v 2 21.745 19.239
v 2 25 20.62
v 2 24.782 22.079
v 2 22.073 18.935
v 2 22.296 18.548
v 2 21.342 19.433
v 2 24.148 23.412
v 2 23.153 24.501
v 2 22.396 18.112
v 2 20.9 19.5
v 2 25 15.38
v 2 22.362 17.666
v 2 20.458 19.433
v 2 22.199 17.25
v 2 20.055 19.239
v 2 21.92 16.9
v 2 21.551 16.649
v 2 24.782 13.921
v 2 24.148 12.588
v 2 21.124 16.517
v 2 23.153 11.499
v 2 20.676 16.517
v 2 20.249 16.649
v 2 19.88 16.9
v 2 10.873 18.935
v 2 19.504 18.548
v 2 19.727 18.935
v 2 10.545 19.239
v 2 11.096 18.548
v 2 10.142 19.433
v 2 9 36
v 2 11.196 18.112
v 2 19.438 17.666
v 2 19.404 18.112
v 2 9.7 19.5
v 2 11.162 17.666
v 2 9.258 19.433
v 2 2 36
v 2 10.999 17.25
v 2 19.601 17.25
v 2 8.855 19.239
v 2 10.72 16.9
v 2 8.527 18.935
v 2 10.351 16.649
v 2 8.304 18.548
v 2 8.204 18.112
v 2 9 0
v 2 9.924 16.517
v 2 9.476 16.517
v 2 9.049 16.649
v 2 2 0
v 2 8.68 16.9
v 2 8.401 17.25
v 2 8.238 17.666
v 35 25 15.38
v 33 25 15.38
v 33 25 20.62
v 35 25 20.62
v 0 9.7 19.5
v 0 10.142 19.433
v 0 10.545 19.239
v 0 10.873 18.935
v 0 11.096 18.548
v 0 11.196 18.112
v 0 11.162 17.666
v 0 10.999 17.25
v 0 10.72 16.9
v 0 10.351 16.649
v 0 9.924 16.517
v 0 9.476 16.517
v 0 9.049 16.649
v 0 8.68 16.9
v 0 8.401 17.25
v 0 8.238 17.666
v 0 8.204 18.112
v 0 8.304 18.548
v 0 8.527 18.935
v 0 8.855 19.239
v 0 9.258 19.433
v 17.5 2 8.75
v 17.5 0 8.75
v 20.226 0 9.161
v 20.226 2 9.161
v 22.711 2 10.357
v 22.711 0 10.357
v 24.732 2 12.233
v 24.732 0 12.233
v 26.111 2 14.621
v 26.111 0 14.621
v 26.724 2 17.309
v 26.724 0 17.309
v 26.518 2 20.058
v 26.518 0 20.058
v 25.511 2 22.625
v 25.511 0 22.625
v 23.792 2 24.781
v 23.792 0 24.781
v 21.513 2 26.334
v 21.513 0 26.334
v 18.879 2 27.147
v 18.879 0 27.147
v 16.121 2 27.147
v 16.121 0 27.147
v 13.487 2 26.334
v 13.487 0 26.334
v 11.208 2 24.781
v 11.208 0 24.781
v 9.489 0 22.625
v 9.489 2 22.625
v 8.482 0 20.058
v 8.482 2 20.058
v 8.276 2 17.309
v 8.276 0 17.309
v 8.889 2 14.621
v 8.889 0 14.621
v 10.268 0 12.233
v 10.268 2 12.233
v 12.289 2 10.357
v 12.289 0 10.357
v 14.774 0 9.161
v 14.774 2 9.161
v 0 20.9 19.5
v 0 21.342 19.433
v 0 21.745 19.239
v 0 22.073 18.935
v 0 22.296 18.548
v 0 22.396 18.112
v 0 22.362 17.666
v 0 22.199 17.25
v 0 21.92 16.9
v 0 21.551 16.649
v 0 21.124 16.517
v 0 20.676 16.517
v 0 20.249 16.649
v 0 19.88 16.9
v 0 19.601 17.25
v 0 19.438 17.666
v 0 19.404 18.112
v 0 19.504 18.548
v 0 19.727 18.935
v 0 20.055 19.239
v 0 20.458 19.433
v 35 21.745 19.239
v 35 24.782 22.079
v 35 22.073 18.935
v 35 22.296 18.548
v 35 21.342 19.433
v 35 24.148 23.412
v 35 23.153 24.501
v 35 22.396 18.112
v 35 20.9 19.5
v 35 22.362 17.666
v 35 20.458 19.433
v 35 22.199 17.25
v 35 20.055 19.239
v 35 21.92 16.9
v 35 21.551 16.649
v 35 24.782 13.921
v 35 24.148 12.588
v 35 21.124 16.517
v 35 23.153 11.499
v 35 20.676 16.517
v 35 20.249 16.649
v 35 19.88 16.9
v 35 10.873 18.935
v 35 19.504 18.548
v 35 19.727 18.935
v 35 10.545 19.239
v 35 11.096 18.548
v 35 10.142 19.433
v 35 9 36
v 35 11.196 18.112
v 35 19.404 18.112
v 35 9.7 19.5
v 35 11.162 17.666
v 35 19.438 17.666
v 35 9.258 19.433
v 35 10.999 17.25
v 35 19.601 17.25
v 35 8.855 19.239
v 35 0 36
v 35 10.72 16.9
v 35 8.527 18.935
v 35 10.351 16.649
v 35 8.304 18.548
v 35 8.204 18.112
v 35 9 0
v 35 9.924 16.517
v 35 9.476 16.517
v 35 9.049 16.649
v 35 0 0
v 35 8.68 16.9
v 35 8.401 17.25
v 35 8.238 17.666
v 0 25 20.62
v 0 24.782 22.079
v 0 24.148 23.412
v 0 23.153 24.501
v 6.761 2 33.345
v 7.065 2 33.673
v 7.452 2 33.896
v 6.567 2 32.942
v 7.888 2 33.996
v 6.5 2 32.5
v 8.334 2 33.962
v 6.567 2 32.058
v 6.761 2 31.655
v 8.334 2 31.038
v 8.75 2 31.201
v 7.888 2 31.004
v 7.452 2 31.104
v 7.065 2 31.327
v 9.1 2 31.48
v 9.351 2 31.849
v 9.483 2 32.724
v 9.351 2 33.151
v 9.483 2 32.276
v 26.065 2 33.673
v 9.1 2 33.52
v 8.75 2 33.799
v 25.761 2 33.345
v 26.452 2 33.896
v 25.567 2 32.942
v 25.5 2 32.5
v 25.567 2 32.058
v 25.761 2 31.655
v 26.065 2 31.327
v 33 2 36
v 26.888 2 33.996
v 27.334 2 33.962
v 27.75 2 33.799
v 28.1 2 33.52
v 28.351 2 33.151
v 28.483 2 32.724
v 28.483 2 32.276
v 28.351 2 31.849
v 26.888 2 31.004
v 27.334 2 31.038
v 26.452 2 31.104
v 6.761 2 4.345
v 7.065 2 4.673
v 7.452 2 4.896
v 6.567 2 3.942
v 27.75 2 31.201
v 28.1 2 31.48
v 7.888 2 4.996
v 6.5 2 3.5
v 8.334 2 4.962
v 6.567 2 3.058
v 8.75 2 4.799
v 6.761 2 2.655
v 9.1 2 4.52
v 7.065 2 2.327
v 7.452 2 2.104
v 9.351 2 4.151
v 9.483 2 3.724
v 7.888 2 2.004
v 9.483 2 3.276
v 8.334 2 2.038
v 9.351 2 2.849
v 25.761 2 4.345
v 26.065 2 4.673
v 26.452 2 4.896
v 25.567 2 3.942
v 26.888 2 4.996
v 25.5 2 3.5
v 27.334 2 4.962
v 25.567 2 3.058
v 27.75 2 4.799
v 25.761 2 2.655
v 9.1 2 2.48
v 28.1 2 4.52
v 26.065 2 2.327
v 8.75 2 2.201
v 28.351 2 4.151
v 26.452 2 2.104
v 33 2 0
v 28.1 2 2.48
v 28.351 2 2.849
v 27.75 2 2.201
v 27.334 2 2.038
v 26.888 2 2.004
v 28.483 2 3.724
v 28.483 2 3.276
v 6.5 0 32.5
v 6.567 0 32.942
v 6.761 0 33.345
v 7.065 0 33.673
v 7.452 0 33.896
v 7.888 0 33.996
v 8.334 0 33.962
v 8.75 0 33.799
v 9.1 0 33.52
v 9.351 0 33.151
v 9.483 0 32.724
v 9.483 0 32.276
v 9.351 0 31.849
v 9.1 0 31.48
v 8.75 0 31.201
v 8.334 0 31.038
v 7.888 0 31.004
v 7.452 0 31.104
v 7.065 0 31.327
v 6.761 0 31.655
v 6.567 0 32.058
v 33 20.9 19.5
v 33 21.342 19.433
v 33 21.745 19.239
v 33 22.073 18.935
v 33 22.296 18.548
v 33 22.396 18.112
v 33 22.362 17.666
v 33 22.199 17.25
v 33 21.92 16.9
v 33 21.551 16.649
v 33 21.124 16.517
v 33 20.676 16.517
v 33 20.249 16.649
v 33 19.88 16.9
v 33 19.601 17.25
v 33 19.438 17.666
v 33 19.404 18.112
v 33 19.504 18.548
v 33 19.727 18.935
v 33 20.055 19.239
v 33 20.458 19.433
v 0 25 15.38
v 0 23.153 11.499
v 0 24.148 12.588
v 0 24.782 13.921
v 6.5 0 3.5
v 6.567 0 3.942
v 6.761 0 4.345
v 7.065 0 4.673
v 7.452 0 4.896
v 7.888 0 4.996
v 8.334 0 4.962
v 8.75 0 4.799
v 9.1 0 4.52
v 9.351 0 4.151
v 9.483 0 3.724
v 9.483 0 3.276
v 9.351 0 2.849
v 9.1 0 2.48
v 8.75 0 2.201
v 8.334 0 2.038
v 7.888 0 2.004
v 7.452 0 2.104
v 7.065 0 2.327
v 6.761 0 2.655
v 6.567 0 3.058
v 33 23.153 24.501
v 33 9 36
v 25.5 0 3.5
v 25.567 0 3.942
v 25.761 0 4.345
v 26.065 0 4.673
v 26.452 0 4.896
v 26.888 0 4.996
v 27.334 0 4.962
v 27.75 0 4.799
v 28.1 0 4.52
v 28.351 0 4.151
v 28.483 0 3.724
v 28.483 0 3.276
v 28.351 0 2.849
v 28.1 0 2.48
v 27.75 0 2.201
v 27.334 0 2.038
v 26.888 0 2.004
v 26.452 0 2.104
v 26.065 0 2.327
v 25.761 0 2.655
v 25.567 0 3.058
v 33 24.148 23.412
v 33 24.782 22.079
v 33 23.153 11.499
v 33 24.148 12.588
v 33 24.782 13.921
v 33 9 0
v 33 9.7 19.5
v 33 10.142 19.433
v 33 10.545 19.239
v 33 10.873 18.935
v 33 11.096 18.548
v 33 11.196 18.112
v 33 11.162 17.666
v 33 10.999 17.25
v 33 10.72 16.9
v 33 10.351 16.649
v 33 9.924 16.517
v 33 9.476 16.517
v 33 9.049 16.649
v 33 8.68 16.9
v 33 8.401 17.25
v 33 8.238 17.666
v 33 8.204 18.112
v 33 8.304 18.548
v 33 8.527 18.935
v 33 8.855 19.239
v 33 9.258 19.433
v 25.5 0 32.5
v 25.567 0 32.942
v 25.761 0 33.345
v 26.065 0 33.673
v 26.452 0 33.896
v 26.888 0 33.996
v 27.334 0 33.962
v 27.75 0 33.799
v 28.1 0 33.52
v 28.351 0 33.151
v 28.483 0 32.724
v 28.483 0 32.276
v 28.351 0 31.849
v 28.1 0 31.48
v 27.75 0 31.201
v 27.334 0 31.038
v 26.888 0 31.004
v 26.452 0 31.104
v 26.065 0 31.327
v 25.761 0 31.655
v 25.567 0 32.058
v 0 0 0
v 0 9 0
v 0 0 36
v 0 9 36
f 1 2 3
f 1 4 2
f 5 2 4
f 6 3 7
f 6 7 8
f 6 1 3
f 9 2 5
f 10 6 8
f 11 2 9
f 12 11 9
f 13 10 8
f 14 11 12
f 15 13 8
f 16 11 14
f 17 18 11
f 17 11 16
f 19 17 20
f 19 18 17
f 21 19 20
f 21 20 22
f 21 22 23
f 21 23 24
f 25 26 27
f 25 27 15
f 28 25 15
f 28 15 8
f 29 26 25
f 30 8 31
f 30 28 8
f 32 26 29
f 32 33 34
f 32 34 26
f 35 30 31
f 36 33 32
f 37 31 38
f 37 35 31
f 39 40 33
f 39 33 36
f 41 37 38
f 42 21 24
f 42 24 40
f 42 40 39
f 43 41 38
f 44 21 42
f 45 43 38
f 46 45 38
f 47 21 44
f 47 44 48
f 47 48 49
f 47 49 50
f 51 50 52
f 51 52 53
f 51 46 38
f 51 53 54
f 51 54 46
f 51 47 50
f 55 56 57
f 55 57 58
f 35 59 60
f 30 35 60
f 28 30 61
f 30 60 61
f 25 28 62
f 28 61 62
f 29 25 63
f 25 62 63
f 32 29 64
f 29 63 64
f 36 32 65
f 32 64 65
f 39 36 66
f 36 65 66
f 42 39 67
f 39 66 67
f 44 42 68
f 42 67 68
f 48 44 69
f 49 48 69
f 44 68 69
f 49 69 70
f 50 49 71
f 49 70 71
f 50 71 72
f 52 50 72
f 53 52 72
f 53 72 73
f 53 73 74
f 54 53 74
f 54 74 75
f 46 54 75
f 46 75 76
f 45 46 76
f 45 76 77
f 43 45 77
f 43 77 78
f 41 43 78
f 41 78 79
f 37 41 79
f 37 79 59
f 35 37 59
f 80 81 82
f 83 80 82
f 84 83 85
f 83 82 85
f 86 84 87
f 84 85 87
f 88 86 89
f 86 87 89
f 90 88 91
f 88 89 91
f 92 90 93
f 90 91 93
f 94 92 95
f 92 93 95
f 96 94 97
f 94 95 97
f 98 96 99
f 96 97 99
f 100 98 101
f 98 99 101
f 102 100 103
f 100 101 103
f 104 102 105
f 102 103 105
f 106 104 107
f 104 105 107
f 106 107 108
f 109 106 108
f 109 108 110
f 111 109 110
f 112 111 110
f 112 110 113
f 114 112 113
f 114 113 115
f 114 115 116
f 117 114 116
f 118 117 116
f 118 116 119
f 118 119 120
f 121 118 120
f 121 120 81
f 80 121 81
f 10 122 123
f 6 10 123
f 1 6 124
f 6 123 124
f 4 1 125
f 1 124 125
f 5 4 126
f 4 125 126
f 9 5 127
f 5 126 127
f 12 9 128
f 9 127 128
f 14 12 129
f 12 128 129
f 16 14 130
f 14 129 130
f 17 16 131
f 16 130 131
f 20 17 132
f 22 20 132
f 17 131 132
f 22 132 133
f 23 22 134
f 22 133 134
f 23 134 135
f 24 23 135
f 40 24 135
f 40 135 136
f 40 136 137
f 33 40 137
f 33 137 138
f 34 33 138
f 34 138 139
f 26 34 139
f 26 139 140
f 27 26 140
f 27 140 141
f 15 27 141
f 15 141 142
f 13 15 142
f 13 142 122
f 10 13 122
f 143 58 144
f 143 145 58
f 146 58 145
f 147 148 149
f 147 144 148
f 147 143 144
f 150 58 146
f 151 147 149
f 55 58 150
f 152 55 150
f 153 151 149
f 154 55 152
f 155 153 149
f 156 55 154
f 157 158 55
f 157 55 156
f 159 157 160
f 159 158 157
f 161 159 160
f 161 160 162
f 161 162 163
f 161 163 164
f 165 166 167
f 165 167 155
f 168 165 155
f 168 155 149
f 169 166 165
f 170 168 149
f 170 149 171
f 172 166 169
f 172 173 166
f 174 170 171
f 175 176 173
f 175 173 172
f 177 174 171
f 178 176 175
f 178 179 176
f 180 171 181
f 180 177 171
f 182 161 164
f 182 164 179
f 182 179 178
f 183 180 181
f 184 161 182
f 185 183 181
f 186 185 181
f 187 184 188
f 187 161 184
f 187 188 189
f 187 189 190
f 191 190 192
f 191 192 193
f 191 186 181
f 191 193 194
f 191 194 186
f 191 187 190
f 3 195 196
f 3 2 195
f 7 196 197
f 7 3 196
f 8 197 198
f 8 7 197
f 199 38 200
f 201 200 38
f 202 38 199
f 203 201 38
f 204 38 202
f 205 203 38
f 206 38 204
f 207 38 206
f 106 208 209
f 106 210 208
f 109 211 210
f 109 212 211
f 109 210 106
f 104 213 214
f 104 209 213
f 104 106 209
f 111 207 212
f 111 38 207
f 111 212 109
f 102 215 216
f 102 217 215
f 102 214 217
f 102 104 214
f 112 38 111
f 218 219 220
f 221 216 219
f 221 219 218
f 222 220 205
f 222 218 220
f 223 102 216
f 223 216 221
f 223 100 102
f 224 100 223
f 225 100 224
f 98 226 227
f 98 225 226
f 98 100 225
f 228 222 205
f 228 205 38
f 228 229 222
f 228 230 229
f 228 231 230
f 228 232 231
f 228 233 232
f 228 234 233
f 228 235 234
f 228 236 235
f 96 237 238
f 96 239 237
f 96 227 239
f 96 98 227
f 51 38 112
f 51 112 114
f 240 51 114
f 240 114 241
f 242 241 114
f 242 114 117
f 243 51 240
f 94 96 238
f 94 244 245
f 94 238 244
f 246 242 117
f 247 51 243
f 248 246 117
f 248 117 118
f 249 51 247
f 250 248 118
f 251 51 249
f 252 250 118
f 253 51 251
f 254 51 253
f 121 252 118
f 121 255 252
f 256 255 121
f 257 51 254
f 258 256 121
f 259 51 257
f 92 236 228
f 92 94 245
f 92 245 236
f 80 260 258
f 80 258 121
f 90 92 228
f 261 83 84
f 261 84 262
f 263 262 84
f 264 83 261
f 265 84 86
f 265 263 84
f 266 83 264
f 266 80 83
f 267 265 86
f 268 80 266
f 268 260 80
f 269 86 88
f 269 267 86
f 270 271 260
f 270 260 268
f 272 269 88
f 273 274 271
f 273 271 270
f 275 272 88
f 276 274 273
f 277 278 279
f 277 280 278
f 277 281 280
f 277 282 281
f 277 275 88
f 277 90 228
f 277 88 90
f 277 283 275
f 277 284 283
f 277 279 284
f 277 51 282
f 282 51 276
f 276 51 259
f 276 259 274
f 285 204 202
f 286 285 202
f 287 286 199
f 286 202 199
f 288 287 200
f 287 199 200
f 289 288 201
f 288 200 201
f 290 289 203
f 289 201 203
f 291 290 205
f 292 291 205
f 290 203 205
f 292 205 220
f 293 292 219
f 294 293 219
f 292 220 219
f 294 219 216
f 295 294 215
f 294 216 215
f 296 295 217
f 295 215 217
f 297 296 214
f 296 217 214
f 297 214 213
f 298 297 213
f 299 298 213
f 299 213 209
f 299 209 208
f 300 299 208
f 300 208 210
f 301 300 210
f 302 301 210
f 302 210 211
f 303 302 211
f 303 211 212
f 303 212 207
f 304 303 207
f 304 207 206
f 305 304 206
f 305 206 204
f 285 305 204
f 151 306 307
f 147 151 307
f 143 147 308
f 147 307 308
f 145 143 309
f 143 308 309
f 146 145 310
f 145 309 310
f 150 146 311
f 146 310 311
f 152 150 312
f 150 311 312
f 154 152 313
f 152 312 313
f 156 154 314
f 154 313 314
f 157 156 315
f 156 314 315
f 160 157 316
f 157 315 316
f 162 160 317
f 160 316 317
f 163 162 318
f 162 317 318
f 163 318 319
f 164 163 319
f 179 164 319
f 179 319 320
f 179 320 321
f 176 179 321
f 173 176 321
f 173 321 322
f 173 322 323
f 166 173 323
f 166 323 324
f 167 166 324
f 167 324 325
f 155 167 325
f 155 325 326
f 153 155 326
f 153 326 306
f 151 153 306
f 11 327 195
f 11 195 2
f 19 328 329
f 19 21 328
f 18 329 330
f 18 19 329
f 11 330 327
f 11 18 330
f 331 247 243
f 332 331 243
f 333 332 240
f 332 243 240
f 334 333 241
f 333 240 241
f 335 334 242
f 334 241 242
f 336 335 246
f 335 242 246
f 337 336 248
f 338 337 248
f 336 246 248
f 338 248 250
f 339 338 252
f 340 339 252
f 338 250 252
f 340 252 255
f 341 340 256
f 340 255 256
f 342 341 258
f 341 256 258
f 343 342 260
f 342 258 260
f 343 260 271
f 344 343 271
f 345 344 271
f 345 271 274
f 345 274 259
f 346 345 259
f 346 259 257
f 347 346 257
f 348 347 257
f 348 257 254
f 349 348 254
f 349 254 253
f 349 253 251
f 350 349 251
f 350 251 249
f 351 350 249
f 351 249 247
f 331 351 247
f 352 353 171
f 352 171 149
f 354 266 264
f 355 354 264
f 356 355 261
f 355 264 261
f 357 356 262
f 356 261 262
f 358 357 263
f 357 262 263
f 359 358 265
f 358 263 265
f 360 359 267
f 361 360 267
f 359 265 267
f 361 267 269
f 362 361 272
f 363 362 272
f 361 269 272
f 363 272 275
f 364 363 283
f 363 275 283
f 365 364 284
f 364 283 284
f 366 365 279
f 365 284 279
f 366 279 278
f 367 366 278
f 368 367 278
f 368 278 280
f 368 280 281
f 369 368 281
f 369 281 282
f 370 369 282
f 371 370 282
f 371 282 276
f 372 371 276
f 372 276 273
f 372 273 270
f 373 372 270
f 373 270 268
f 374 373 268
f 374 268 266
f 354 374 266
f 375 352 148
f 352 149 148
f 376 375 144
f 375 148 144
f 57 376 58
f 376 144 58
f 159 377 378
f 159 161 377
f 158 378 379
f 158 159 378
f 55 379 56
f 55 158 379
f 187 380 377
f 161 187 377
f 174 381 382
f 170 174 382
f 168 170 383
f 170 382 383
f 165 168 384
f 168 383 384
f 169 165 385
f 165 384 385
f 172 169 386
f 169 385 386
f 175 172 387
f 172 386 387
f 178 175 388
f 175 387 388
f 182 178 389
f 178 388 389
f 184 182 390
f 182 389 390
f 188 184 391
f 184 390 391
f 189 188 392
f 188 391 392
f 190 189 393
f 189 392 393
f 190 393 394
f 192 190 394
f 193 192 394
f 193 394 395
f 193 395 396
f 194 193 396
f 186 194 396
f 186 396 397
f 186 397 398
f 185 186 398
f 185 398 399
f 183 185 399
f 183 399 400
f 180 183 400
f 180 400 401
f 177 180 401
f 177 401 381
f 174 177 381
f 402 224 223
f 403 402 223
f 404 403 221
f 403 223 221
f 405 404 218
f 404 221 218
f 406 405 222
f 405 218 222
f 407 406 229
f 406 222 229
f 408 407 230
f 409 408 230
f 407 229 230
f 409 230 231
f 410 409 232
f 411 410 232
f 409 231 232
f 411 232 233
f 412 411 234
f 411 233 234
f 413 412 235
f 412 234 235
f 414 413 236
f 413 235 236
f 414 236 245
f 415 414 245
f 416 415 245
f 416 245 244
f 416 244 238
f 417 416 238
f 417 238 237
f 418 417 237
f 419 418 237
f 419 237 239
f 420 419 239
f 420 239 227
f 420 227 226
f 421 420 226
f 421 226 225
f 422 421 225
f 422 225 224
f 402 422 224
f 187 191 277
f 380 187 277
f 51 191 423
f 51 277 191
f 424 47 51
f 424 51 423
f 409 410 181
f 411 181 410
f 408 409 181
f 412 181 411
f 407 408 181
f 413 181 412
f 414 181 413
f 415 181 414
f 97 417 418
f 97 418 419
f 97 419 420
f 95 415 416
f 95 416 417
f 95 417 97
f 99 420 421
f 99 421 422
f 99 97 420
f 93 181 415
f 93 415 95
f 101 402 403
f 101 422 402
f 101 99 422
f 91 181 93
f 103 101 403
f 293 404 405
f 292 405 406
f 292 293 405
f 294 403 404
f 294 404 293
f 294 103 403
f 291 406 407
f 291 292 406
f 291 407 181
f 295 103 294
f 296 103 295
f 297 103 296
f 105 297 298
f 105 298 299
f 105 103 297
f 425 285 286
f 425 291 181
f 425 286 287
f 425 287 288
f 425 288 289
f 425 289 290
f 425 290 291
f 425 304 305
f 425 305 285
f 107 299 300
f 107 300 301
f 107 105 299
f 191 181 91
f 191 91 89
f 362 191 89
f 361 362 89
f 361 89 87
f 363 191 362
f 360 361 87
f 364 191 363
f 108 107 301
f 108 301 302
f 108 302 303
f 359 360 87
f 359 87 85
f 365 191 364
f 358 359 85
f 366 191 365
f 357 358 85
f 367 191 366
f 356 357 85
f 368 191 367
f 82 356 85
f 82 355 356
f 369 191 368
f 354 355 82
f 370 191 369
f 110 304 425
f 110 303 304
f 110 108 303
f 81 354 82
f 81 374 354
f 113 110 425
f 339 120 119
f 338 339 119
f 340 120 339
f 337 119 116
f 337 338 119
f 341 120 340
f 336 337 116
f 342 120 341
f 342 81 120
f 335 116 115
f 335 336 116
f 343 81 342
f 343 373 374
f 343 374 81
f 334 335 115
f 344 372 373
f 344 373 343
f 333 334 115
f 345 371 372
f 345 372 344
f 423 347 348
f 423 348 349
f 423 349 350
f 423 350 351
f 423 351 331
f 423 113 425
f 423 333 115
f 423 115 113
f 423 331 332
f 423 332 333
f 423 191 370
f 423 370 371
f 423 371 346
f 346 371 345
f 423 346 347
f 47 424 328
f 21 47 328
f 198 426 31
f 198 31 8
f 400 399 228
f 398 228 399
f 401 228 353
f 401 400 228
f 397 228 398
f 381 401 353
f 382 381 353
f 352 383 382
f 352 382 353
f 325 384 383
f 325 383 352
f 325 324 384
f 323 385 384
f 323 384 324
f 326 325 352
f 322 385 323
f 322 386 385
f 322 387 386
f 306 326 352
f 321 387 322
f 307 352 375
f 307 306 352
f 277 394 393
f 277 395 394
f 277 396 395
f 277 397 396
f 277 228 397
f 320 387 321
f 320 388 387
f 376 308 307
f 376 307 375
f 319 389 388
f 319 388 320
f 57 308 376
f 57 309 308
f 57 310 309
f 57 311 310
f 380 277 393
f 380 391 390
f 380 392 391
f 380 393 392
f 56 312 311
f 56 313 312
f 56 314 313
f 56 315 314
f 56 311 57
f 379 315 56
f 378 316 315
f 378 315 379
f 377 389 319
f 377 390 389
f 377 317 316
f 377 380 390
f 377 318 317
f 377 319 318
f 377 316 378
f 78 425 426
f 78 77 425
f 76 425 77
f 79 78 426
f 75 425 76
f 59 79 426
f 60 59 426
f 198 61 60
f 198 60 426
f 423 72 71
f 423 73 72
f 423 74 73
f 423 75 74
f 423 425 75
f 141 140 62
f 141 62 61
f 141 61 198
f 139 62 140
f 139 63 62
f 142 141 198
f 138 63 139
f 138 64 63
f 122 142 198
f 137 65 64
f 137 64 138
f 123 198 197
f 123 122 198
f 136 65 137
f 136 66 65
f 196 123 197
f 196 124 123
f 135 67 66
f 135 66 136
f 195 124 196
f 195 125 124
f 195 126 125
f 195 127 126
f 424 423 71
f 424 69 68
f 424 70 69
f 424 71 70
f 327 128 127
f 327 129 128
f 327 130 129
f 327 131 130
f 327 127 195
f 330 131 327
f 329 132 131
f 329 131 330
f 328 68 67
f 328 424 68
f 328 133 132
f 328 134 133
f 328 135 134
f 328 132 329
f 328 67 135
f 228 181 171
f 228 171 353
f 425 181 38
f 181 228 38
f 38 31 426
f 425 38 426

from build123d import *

# Parameters (mm, degrees)
EXTRUDE_1_DEPTH     = 36
SKETCH_2_R          = 9.25
CUT_EXTRUDE_1_DEPTH = 12
SKETCH_3_R          = 1.5
CUT_EXTRUDE_2_DEPTH = 54
SKETCH_5_R          = 1.5
CUT_EXTRUDE_4_DEPTH = 10
CUT_EXTRUDE_5_DEPTH = 57
FILLET_1_R          = 5


with BuildPart() as part:
    # 草图1 → 凸台-拉伸1 (new body)
    with BuildSketch(Plane.XY):
        Polygon((0, 0), (0, 25), (2, 25), (2, 2), (33, 2), (33, 25), (35, 25), (35, 0), align=None)
    extrude(amount=EXTRUDE_1_DEPTH)

    # 草图2 → 切除-拉伸1 (cut)
    with BuildSketch(Plane.XZ):
        with Locations(Location((17.5, 18, 0), (0, 0, 270))):
            Circle(SKETCH_2_R)
    extrude(amount=-CUT_EXTRUDE_1_DEPTH, mode=Mode.SUBTRACT)

    # 草图3 → 切除-拉伸2 (cut)
    with BuildSketch(Plane.ZY):
        with Locations((18, 20.9)):
            Circle(SKETCH_3_R)
        with Locations((18, 9.7)):
            Circle(SKETCH_3_R)
    extrude(amount=-CUT_EXTRUDE_2_DEPTH, mode=Mode.SUBTRACT)

    # 草图5 → 切除-拉伸4 (cut)
    with BuildSketch(Plane(origin=(0, 2, 0), x_dir=(1, 0, 0), z_dir=(0, 1, 0))):
        with Locations(Location((8, -3.5, 0), (0, 0, 180))):
            Circle(SKETCH_5_R)
        with Locations(Location((27, -3.5, 0), (0, 0, 180))):
            Circle(SKETCH_5_R)
        with Locations(Location((8, -32.5, 0), (0, 0, 180))):
            Circle(SKETCH_5_R)
        with Locations(Location((27, -32.5, 0), (0, 0, 180))):
            Circle(SKETCH_5_R)
    extrude(amount=-CUT_EXTRUDE_4_DEPTH, mode=Mode.SUBTRACT)

    # 草图6 → 切除-拉伸5 (cut)
    with BuildSketch(Plane.ZY):
        Polygon((0, 9), (13, 25), (0, 25), align=None)
        Polygon((36, 25), (36, 9), (23, 25), align=None)
    extrude(amount=-CUT_EXTRUDE_5_DEPTH, mode=Mode.SUBTRACT)

    # 圆角1
    fillet_1_edges = [part.edges().sort_by_distance(p)[0] for p in [
        (34, 25, 13),
        (1, 25, 13),
        (34, 25, 23),
        (1, 25, 23),
    ]]
    fillet(fillet_1_edges, radius=FILLET_1_R)


solid = part.part
